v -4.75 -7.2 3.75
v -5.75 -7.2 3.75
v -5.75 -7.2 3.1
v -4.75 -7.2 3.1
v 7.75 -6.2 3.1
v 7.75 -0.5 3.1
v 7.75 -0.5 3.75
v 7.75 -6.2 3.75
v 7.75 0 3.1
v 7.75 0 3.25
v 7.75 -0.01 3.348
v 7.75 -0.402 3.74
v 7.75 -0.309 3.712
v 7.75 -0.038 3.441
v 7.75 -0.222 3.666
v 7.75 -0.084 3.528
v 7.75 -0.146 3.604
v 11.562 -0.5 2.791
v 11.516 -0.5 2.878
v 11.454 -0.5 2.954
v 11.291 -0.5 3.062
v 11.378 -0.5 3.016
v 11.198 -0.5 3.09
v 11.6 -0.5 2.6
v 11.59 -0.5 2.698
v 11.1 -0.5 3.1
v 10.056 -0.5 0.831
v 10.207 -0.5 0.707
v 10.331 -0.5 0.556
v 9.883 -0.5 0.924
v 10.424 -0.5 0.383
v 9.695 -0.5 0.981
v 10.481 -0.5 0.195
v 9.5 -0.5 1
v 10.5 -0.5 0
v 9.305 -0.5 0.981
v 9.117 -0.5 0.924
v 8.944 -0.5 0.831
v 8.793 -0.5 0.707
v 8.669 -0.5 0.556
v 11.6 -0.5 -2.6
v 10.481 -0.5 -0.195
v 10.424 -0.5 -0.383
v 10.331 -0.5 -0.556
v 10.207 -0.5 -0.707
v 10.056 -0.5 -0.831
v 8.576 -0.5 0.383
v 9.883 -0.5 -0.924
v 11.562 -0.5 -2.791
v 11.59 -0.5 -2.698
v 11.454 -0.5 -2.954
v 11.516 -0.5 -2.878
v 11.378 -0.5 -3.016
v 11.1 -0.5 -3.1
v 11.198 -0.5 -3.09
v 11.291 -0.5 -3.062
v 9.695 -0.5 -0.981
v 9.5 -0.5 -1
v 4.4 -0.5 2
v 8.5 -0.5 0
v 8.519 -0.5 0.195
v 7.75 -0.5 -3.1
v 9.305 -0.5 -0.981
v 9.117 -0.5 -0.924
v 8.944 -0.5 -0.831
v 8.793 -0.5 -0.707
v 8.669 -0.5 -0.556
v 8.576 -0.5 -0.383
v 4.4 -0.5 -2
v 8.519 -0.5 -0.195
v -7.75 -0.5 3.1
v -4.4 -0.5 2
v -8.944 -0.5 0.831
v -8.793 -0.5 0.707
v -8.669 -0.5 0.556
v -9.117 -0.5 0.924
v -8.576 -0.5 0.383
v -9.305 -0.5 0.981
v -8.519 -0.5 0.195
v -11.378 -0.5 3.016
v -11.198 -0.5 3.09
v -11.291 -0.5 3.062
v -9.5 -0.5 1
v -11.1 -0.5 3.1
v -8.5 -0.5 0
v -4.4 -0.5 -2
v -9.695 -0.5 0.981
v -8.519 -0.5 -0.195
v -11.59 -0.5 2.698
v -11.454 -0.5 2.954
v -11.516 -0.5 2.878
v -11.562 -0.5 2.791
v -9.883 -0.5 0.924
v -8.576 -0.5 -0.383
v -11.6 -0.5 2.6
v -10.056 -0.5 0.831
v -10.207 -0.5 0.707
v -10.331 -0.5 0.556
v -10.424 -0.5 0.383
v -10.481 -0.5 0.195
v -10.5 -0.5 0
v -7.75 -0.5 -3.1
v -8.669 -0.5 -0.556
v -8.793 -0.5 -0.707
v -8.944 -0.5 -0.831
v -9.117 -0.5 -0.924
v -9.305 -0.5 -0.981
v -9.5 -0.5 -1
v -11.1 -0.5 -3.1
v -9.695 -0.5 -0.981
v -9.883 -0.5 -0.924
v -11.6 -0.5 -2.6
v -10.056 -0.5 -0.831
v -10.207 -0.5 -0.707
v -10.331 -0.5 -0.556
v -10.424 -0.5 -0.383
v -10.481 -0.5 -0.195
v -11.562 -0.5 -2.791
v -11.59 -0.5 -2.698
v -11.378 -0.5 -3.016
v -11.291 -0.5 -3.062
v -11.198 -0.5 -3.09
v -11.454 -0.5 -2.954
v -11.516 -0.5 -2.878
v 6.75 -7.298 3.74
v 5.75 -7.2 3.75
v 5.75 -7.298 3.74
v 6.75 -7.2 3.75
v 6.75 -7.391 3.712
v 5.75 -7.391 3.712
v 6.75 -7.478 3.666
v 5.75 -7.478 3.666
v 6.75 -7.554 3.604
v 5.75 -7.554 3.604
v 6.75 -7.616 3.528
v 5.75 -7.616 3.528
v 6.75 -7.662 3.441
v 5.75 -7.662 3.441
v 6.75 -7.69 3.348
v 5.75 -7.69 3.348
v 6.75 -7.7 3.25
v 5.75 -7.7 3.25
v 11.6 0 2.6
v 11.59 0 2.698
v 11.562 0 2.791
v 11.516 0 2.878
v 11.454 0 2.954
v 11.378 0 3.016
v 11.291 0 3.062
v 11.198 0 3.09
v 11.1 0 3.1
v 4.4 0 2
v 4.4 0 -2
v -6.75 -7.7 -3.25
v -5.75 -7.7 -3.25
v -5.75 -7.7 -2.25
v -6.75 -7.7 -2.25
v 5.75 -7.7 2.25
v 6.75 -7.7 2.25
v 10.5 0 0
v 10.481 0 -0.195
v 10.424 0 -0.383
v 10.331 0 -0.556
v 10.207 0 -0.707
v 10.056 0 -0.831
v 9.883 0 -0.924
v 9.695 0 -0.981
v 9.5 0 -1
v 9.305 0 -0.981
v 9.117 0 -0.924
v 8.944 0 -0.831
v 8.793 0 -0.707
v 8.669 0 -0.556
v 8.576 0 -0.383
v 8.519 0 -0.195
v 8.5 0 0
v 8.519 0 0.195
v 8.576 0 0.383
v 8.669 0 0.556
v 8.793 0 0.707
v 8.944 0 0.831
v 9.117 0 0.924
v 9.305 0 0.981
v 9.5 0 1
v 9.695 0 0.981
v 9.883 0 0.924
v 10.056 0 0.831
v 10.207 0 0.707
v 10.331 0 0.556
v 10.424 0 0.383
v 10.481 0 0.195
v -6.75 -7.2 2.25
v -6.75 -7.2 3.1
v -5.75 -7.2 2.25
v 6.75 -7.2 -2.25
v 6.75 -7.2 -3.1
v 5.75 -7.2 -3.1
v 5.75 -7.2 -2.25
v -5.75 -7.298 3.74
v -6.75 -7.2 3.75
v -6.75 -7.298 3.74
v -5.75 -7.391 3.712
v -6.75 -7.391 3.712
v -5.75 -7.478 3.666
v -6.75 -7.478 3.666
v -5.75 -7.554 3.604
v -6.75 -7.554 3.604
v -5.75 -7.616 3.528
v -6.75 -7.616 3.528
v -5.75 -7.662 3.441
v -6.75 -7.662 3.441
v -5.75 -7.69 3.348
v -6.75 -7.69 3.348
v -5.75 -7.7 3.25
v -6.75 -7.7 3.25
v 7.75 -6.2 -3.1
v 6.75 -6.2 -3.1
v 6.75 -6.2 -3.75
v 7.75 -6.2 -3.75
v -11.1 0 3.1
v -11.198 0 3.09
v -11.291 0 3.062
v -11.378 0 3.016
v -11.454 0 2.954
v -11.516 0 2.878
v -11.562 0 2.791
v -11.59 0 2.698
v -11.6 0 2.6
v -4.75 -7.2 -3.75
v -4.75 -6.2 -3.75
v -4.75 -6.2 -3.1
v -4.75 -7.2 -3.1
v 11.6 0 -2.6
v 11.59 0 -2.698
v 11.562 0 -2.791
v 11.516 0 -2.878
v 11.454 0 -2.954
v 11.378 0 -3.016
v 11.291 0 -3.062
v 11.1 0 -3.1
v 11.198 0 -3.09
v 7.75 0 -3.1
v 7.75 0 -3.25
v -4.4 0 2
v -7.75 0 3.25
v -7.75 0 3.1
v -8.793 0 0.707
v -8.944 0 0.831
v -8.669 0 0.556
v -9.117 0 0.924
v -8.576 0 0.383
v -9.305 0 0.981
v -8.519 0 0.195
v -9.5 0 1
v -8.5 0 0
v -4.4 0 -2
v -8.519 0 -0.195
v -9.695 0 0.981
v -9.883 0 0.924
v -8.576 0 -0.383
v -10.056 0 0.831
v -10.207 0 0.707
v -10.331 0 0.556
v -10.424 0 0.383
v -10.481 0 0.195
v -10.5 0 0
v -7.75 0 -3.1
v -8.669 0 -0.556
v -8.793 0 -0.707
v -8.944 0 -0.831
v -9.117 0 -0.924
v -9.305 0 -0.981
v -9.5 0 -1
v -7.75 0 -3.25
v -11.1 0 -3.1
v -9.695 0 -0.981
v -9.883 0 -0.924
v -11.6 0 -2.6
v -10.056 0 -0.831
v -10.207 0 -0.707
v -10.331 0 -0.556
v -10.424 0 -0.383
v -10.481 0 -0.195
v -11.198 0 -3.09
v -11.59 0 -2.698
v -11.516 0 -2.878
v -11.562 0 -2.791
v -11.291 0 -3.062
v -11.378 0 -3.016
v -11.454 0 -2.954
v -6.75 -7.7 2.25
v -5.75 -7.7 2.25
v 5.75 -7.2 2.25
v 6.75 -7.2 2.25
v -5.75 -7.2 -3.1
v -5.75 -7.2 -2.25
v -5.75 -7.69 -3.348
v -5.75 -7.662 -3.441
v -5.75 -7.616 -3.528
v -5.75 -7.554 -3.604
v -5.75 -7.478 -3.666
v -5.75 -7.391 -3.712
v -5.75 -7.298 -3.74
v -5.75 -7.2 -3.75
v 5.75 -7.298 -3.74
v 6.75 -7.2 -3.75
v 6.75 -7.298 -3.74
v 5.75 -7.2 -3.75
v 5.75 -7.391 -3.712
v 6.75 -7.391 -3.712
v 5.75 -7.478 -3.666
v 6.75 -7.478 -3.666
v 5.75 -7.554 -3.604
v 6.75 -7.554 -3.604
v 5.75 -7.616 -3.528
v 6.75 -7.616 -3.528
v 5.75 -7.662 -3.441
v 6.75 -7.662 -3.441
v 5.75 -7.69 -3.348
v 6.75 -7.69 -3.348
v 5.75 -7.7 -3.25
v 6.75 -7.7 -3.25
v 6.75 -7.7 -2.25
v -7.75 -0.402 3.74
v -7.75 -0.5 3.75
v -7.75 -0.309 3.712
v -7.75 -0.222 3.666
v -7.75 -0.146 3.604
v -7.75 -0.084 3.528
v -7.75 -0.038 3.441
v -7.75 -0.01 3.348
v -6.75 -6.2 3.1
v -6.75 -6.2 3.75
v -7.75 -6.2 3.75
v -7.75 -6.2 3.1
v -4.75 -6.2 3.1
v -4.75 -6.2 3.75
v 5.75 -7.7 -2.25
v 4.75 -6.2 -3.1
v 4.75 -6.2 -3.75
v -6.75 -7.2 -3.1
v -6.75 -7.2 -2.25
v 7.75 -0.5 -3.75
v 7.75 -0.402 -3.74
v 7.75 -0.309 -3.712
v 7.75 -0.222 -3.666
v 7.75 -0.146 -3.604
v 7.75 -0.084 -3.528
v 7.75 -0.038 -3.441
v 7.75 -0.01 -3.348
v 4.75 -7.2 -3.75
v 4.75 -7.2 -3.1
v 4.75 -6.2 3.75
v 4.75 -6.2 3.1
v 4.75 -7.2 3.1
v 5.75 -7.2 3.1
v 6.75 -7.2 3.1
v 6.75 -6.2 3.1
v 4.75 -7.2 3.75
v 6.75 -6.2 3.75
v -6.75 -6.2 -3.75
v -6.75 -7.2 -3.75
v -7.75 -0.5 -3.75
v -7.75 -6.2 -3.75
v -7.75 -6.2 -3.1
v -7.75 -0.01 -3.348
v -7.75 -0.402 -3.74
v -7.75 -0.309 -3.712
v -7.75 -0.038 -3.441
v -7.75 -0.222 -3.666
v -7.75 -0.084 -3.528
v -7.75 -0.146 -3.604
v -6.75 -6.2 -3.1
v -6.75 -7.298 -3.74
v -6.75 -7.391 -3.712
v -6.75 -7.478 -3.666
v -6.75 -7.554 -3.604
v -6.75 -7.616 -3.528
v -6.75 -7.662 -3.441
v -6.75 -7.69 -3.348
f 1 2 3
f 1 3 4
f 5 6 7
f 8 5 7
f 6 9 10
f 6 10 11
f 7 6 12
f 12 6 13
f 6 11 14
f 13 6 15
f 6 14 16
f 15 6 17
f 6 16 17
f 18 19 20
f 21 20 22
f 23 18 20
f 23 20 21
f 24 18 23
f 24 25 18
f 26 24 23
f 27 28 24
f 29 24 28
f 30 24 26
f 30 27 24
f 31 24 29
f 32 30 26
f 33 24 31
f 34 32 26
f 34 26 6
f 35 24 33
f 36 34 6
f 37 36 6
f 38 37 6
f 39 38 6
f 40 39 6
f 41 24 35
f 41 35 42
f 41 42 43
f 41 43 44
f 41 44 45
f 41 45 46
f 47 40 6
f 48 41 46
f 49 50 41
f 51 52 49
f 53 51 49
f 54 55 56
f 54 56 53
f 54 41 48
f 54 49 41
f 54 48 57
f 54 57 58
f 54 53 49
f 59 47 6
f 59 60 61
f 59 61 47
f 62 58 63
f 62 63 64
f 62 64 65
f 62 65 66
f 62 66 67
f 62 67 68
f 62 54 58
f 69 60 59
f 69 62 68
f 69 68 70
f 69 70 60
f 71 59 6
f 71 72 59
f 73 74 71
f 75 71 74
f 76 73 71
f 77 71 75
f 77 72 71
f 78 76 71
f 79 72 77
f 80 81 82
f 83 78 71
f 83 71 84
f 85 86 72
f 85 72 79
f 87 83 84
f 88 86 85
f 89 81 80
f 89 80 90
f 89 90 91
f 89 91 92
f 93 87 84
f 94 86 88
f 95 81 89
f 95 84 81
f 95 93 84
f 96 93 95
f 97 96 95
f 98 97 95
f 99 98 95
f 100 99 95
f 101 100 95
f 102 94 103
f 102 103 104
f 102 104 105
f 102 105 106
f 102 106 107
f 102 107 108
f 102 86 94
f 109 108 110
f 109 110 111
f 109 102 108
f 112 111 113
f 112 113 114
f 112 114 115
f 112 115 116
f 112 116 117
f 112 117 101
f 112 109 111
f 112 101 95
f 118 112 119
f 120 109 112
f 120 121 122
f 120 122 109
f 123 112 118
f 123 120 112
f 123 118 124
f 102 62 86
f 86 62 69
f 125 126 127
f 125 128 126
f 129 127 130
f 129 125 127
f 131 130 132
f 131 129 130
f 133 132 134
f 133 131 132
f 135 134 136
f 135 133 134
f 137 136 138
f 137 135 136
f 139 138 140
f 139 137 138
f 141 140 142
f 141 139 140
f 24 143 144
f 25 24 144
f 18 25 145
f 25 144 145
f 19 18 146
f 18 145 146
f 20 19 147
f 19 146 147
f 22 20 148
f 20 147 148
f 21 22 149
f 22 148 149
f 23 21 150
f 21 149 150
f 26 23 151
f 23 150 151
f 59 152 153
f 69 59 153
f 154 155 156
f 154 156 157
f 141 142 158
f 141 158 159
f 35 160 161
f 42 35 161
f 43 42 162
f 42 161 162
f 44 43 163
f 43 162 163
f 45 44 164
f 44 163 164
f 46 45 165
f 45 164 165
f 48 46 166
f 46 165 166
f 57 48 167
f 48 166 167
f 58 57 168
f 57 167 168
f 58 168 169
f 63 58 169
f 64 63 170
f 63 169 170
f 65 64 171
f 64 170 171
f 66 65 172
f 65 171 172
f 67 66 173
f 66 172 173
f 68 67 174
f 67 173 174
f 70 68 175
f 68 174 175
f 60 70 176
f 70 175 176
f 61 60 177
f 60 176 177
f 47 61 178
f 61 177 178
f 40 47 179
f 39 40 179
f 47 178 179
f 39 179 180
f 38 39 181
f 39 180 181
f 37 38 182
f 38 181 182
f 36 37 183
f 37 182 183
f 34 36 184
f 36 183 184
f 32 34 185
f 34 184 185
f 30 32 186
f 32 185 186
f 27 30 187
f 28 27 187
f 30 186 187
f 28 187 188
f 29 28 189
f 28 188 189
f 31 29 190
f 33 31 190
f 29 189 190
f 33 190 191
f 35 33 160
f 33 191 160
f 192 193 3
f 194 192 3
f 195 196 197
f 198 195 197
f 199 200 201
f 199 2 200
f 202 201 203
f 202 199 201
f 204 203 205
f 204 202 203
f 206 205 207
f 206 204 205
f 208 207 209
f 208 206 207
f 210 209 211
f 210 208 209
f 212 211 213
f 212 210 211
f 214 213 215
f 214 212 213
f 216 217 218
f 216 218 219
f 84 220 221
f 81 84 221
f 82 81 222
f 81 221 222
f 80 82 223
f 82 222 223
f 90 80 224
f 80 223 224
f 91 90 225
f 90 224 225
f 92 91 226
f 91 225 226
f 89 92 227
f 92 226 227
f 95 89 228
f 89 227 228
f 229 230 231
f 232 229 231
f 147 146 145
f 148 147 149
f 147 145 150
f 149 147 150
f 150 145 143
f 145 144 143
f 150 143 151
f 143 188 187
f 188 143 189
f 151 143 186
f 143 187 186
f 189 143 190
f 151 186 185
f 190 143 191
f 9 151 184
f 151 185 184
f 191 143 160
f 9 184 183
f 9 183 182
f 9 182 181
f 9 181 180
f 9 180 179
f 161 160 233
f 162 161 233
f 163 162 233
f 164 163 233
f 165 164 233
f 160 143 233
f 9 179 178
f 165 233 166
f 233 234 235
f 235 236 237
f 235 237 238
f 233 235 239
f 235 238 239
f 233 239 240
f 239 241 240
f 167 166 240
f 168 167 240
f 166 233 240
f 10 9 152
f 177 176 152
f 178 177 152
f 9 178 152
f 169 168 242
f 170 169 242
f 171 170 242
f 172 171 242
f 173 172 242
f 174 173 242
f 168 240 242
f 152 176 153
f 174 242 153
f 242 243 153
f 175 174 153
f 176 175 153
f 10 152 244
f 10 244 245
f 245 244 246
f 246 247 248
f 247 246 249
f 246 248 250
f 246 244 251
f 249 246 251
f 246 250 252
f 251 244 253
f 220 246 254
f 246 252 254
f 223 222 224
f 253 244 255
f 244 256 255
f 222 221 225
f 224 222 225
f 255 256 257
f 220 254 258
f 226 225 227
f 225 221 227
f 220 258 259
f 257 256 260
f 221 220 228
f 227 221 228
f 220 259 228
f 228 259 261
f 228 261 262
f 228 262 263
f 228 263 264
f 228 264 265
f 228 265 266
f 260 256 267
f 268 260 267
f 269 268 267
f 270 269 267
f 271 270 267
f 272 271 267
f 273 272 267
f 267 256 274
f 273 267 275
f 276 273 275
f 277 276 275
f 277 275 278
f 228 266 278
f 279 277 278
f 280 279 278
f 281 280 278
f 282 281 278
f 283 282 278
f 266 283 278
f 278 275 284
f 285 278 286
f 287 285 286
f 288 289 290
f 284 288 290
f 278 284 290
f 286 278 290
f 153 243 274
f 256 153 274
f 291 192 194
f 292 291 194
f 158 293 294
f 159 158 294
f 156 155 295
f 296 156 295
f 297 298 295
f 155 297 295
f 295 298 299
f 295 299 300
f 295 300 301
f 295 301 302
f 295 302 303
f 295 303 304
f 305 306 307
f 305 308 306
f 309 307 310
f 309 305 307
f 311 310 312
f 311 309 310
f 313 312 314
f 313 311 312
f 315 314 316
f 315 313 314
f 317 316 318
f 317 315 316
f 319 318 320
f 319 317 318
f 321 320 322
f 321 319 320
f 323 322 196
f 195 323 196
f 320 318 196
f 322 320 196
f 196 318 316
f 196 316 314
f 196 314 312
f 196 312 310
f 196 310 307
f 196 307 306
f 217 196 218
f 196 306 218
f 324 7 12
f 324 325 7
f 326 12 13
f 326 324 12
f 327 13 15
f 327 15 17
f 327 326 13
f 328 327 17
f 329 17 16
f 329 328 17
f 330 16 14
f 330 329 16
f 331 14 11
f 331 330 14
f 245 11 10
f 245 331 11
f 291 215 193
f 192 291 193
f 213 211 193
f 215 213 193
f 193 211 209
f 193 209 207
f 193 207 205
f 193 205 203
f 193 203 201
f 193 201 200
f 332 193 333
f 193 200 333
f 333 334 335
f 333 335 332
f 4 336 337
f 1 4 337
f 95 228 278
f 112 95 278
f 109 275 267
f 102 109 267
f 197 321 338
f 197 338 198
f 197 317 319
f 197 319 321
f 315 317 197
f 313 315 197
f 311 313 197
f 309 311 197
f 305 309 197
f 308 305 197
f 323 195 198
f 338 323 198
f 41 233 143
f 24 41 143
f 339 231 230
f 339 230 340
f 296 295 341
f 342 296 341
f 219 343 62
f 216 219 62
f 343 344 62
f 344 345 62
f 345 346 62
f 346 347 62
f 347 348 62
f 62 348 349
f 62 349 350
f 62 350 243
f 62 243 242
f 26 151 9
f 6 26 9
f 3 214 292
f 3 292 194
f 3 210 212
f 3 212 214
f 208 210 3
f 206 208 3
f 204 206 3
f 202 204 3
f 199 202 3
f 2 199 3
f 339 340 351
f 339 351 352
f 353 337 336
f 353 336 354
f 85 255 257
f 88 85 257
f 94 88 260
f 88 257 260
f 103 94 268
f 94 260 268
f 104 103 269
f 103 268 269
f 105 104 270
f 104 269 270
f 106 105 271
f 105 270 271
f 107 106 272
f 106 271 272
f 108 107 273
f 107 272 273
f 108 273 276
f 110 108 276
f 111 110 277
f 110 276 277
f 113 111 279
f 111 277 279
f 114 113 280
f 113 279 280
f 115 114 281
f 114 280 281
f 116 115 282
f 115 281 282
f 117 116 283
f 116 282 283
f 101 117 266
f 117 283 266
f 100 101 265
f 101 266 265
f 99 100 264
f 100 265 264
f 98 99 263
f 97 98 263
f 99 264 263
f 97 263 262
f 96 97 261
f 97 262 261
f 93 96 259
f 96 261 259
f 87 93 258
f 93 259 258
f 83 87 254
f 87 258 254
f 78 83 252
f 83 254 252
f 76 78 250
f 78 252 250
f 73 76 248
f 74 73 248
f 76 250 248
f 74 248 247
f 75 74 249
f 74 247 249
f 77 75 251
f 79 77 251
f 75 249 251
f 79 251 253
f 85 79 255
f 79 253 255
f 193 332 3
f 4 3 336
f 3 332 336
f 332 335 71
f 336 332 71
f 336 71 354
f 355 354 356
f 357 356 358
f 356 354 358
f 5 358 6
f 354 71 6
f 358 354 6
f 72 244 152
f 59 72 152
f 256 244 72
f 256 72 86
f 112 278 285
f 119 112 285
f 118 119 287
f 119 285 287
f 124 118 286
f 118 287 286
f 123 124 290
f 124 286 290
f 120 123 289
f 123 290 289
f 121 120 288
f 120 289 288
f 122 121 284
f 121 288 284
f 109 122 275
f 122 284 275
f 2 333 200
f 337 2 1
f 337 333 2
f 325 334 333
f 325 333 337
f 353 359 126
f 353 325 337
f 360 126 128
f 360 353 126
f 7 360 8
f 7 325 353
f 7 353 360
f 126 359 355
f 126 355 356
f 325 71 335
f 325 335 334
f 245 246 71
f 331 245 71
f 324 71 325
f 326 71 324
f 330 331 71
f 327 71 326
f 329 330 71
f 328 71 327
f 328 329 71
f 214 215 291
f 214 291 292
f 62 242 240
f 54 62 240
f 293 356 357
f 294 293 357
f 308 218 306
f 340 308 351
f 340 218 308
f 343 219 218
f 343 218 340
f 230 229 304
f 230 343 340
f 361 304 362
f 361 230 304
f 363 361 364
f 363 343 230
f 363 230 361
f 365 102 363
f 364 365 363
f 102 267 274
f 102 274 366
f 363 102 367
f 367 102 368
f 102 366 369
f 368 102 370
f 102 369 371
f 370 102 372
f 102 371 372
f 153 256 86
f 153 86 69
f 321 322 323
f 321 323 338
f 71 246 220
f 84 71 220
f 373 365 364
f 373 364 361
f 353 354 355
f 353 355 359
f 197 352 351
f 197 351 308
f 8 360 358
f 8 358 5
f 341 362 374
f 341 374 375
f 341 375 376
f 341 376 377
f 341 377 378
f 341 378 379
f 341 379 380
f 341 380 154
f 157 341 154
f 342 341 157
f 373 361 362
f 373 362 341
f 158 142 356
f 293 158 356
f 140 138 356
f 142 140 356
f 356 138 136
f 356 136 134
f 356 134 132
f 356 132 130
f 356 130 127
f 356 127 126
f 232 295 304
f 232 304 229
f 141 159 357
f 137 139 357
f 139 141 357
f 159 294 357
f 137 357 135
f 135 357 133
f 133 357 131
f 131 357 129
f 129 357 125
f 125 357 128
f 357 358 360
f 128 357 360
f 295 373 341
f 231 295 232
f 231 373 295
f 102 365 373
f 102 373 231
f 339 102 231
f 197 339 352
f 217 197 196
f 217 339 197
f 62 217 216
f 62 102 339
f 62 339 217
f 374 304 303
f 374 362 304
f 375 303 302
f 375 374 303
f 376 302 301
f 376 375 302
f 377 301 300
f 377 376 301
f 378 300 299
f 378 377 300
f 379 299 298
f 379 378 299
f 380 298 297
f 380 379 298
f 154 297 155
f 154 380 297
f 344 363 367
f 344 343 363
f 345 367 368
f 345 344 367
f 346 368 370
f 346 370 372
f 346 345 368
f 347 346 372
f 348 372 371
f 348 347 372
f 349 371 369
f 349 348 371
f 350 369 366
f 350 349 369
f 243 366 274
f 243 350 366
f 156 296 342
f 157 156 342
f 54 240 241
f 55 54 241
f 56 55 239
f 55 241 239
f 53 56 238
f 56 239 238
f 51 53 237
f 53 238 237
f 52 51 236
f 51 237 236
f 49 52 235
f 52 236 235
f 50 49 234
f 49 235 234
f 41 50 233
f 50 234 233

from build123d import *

# Parameters (mm, degrees)
SKETCH1_R           = 1
SKETCH1_W           = 8.8
SKETCH1_H           = 4
BOSS_EXTRUDE1_DEPTH = 0.5
SKETCH2_W           = 15.5
SKETCH2_H           = 0.65
BOSS_EXTRUDE2_DEPTH = 5.7
SKETCH5_W           = 2
SKETCH5_H           = 0.65
BOSS_EXTRUDE4_DEPTH = 1
SKETCH6_W           = 1
SKETCH6_H           = 0.5
BOSS_EXTRUDE5_DEPTH = 1.5
FILLET1_R           = 0.5
SKETCH7_W           = 1
SKETCH7_H           = 0.5
BOSS_EXTRUDE6_DEPTH = 1.5
FILLET2_R           = 0.5


with BuildPart() as part:
    # Sketch1 → Boss-Extrude1 (new body)
    with BuildSketch(Plane(origin=(0, 0, 0), x_dir=(1, 0, 0), z_dir=(0, 1, 0))):
        with BuildLine():
            Line((11.6, 2.6), (11.6, -2.6))
            ThreePointArc((11.6, -2.6), (11.453553391, -2.953553391), (11.1, -3.1))
            Line((11.1, -3.1), (7.75, -3.1))
            Line((7.75, -3.1), (7.75, -3.75))
            Line((7.75, -3.75), (-7.75, -3.75))
            Line((-7.75, -3.75), (-7.75, -3.1))
            Line((-7.75, -3.1), (-11.1, -3.1))
            ThreePointArc((-11.1, -3.1), (-11.453553391, -2.953553391), (-11.6, -2.6))
            Line((-11.6, -2.6), (-11.6, 2.6))
            ThreePointArc((-11.6, 2.6), (-11.453553391, 2.953553391), (-11.1, 3.1))
            Line((-11.1, 3.1), (-7.75, 3.1))
            Line((-7.75, 3.1), (-7.75, 3.75))
            Line((-7.75, 3.75), (7.75, 3.75))
            Line((7.75, 3.75), (7.75, 3.1))
            Line((7.75, 3.1), (11.1, 3.1))
            ThreePointArc((11.1, 3.1), (11.453553391, 2.953553391), (11.6, 2.6))
        make_face()
        with Locations((9.5, 0)):
            Circle(SKETCH1_R, mode=Mode.SUBTRACT)
        with Locations((-9.5, 0)):
            Circle(SKETCH1_R, mode=Mode.SUBTRACT)
        Rectangle(SKETCH1_W, SKETCH1_H, mode=Mode.SUBTRACT)
    extrude(amount=-BOSS_EXTRUDE1_DEPTH)

    # Sketch2 → Boss-Extrude2 (add)
    with BuildSketch(Plane.XZ.offset(0.5)):
        with Locations((0, 3.425)):
            Rectangle(SKETCH2_W, SKETCH2_H)
        with Locations((0, -3.425)):
            Rectangle(SKETCH2_W, SKETCH2_H)
    extrude(amount=BOSS_EXTRUDE2_DEPTH)

    # Sketch5 → Boss-Extrude4 (add)
    with BuildSketch(Plane.XZ.offset(6.2)):
        with Locations((-5.75, 3.425)):
            Rectangle(SKETCH5_W, SKETCH5_H)
        with Locations((-5.75, -3.425)):
            Rectangle(SKETCH5_W, SKETCH5_H)
        with Locations((5.75, -3.425)):
            Rectangle(SKETCH5_W, SKETCH5_H)
        with Locations((5.75, 3.425)):
            Rectangle(SKETCH5_W, SKETCH5_H)
    extrude(amount=BOSS_EXTRUDE4_DEPTH)

    # Sketch6 → Boss-Extrude5 (add)
    with BuildSketch(Plane(origin=(0, 0, -3.75), x_dir=(-1, 0, 0), z_dir=(0, 0, -1))):
        with Locations((-6.25, -7.45)):
            Rectangle(SKETCH6_W, SKETCH6_H)
        with Locations((6.25, -7.45)):
            Rectangle(SKETCH6_W, SKETCH6_H)
    extrude(amount=-BOSS_EXTRUDE5_DEPTH)

    # Fillet1
    fillet1_edges = [part.edges().sort_by_distance(p)[0] for p in [
        (-6.25, -7.7, -3.75),
        (6.25, -7.7, -3.75),
        (0, 0, -3.75),
    ]]
    fillet(fillet1_edges, radius=FILLET1_R)

    # Sketch7 → Boss-Extrude6 (add)
    with BuildSketch(Plane.XY.offset(3.75)):
        with Locations((-6.25, -7.45)):
            Rectangle(SKETCH7_W, SKETCH7_H)
        with Locations((6.25, -7.45)):
            Rectangle(SKETCH7_W, SKETCH7_H)
    extrude(amount=-BOSS_EXTRUDE6_DEPTH)

    # Fillet2
    fillet2_edges = [part.edges().sort_by_distance(p)[0] for p in [
        (0, 0, 3.75),
        (6.25, -7.7, 3.75),
        (-6.25, -7.7, 3.75),
    ]]
    fillet(fillet2_edges, radius=FILLET2_R)


solid = part.part
